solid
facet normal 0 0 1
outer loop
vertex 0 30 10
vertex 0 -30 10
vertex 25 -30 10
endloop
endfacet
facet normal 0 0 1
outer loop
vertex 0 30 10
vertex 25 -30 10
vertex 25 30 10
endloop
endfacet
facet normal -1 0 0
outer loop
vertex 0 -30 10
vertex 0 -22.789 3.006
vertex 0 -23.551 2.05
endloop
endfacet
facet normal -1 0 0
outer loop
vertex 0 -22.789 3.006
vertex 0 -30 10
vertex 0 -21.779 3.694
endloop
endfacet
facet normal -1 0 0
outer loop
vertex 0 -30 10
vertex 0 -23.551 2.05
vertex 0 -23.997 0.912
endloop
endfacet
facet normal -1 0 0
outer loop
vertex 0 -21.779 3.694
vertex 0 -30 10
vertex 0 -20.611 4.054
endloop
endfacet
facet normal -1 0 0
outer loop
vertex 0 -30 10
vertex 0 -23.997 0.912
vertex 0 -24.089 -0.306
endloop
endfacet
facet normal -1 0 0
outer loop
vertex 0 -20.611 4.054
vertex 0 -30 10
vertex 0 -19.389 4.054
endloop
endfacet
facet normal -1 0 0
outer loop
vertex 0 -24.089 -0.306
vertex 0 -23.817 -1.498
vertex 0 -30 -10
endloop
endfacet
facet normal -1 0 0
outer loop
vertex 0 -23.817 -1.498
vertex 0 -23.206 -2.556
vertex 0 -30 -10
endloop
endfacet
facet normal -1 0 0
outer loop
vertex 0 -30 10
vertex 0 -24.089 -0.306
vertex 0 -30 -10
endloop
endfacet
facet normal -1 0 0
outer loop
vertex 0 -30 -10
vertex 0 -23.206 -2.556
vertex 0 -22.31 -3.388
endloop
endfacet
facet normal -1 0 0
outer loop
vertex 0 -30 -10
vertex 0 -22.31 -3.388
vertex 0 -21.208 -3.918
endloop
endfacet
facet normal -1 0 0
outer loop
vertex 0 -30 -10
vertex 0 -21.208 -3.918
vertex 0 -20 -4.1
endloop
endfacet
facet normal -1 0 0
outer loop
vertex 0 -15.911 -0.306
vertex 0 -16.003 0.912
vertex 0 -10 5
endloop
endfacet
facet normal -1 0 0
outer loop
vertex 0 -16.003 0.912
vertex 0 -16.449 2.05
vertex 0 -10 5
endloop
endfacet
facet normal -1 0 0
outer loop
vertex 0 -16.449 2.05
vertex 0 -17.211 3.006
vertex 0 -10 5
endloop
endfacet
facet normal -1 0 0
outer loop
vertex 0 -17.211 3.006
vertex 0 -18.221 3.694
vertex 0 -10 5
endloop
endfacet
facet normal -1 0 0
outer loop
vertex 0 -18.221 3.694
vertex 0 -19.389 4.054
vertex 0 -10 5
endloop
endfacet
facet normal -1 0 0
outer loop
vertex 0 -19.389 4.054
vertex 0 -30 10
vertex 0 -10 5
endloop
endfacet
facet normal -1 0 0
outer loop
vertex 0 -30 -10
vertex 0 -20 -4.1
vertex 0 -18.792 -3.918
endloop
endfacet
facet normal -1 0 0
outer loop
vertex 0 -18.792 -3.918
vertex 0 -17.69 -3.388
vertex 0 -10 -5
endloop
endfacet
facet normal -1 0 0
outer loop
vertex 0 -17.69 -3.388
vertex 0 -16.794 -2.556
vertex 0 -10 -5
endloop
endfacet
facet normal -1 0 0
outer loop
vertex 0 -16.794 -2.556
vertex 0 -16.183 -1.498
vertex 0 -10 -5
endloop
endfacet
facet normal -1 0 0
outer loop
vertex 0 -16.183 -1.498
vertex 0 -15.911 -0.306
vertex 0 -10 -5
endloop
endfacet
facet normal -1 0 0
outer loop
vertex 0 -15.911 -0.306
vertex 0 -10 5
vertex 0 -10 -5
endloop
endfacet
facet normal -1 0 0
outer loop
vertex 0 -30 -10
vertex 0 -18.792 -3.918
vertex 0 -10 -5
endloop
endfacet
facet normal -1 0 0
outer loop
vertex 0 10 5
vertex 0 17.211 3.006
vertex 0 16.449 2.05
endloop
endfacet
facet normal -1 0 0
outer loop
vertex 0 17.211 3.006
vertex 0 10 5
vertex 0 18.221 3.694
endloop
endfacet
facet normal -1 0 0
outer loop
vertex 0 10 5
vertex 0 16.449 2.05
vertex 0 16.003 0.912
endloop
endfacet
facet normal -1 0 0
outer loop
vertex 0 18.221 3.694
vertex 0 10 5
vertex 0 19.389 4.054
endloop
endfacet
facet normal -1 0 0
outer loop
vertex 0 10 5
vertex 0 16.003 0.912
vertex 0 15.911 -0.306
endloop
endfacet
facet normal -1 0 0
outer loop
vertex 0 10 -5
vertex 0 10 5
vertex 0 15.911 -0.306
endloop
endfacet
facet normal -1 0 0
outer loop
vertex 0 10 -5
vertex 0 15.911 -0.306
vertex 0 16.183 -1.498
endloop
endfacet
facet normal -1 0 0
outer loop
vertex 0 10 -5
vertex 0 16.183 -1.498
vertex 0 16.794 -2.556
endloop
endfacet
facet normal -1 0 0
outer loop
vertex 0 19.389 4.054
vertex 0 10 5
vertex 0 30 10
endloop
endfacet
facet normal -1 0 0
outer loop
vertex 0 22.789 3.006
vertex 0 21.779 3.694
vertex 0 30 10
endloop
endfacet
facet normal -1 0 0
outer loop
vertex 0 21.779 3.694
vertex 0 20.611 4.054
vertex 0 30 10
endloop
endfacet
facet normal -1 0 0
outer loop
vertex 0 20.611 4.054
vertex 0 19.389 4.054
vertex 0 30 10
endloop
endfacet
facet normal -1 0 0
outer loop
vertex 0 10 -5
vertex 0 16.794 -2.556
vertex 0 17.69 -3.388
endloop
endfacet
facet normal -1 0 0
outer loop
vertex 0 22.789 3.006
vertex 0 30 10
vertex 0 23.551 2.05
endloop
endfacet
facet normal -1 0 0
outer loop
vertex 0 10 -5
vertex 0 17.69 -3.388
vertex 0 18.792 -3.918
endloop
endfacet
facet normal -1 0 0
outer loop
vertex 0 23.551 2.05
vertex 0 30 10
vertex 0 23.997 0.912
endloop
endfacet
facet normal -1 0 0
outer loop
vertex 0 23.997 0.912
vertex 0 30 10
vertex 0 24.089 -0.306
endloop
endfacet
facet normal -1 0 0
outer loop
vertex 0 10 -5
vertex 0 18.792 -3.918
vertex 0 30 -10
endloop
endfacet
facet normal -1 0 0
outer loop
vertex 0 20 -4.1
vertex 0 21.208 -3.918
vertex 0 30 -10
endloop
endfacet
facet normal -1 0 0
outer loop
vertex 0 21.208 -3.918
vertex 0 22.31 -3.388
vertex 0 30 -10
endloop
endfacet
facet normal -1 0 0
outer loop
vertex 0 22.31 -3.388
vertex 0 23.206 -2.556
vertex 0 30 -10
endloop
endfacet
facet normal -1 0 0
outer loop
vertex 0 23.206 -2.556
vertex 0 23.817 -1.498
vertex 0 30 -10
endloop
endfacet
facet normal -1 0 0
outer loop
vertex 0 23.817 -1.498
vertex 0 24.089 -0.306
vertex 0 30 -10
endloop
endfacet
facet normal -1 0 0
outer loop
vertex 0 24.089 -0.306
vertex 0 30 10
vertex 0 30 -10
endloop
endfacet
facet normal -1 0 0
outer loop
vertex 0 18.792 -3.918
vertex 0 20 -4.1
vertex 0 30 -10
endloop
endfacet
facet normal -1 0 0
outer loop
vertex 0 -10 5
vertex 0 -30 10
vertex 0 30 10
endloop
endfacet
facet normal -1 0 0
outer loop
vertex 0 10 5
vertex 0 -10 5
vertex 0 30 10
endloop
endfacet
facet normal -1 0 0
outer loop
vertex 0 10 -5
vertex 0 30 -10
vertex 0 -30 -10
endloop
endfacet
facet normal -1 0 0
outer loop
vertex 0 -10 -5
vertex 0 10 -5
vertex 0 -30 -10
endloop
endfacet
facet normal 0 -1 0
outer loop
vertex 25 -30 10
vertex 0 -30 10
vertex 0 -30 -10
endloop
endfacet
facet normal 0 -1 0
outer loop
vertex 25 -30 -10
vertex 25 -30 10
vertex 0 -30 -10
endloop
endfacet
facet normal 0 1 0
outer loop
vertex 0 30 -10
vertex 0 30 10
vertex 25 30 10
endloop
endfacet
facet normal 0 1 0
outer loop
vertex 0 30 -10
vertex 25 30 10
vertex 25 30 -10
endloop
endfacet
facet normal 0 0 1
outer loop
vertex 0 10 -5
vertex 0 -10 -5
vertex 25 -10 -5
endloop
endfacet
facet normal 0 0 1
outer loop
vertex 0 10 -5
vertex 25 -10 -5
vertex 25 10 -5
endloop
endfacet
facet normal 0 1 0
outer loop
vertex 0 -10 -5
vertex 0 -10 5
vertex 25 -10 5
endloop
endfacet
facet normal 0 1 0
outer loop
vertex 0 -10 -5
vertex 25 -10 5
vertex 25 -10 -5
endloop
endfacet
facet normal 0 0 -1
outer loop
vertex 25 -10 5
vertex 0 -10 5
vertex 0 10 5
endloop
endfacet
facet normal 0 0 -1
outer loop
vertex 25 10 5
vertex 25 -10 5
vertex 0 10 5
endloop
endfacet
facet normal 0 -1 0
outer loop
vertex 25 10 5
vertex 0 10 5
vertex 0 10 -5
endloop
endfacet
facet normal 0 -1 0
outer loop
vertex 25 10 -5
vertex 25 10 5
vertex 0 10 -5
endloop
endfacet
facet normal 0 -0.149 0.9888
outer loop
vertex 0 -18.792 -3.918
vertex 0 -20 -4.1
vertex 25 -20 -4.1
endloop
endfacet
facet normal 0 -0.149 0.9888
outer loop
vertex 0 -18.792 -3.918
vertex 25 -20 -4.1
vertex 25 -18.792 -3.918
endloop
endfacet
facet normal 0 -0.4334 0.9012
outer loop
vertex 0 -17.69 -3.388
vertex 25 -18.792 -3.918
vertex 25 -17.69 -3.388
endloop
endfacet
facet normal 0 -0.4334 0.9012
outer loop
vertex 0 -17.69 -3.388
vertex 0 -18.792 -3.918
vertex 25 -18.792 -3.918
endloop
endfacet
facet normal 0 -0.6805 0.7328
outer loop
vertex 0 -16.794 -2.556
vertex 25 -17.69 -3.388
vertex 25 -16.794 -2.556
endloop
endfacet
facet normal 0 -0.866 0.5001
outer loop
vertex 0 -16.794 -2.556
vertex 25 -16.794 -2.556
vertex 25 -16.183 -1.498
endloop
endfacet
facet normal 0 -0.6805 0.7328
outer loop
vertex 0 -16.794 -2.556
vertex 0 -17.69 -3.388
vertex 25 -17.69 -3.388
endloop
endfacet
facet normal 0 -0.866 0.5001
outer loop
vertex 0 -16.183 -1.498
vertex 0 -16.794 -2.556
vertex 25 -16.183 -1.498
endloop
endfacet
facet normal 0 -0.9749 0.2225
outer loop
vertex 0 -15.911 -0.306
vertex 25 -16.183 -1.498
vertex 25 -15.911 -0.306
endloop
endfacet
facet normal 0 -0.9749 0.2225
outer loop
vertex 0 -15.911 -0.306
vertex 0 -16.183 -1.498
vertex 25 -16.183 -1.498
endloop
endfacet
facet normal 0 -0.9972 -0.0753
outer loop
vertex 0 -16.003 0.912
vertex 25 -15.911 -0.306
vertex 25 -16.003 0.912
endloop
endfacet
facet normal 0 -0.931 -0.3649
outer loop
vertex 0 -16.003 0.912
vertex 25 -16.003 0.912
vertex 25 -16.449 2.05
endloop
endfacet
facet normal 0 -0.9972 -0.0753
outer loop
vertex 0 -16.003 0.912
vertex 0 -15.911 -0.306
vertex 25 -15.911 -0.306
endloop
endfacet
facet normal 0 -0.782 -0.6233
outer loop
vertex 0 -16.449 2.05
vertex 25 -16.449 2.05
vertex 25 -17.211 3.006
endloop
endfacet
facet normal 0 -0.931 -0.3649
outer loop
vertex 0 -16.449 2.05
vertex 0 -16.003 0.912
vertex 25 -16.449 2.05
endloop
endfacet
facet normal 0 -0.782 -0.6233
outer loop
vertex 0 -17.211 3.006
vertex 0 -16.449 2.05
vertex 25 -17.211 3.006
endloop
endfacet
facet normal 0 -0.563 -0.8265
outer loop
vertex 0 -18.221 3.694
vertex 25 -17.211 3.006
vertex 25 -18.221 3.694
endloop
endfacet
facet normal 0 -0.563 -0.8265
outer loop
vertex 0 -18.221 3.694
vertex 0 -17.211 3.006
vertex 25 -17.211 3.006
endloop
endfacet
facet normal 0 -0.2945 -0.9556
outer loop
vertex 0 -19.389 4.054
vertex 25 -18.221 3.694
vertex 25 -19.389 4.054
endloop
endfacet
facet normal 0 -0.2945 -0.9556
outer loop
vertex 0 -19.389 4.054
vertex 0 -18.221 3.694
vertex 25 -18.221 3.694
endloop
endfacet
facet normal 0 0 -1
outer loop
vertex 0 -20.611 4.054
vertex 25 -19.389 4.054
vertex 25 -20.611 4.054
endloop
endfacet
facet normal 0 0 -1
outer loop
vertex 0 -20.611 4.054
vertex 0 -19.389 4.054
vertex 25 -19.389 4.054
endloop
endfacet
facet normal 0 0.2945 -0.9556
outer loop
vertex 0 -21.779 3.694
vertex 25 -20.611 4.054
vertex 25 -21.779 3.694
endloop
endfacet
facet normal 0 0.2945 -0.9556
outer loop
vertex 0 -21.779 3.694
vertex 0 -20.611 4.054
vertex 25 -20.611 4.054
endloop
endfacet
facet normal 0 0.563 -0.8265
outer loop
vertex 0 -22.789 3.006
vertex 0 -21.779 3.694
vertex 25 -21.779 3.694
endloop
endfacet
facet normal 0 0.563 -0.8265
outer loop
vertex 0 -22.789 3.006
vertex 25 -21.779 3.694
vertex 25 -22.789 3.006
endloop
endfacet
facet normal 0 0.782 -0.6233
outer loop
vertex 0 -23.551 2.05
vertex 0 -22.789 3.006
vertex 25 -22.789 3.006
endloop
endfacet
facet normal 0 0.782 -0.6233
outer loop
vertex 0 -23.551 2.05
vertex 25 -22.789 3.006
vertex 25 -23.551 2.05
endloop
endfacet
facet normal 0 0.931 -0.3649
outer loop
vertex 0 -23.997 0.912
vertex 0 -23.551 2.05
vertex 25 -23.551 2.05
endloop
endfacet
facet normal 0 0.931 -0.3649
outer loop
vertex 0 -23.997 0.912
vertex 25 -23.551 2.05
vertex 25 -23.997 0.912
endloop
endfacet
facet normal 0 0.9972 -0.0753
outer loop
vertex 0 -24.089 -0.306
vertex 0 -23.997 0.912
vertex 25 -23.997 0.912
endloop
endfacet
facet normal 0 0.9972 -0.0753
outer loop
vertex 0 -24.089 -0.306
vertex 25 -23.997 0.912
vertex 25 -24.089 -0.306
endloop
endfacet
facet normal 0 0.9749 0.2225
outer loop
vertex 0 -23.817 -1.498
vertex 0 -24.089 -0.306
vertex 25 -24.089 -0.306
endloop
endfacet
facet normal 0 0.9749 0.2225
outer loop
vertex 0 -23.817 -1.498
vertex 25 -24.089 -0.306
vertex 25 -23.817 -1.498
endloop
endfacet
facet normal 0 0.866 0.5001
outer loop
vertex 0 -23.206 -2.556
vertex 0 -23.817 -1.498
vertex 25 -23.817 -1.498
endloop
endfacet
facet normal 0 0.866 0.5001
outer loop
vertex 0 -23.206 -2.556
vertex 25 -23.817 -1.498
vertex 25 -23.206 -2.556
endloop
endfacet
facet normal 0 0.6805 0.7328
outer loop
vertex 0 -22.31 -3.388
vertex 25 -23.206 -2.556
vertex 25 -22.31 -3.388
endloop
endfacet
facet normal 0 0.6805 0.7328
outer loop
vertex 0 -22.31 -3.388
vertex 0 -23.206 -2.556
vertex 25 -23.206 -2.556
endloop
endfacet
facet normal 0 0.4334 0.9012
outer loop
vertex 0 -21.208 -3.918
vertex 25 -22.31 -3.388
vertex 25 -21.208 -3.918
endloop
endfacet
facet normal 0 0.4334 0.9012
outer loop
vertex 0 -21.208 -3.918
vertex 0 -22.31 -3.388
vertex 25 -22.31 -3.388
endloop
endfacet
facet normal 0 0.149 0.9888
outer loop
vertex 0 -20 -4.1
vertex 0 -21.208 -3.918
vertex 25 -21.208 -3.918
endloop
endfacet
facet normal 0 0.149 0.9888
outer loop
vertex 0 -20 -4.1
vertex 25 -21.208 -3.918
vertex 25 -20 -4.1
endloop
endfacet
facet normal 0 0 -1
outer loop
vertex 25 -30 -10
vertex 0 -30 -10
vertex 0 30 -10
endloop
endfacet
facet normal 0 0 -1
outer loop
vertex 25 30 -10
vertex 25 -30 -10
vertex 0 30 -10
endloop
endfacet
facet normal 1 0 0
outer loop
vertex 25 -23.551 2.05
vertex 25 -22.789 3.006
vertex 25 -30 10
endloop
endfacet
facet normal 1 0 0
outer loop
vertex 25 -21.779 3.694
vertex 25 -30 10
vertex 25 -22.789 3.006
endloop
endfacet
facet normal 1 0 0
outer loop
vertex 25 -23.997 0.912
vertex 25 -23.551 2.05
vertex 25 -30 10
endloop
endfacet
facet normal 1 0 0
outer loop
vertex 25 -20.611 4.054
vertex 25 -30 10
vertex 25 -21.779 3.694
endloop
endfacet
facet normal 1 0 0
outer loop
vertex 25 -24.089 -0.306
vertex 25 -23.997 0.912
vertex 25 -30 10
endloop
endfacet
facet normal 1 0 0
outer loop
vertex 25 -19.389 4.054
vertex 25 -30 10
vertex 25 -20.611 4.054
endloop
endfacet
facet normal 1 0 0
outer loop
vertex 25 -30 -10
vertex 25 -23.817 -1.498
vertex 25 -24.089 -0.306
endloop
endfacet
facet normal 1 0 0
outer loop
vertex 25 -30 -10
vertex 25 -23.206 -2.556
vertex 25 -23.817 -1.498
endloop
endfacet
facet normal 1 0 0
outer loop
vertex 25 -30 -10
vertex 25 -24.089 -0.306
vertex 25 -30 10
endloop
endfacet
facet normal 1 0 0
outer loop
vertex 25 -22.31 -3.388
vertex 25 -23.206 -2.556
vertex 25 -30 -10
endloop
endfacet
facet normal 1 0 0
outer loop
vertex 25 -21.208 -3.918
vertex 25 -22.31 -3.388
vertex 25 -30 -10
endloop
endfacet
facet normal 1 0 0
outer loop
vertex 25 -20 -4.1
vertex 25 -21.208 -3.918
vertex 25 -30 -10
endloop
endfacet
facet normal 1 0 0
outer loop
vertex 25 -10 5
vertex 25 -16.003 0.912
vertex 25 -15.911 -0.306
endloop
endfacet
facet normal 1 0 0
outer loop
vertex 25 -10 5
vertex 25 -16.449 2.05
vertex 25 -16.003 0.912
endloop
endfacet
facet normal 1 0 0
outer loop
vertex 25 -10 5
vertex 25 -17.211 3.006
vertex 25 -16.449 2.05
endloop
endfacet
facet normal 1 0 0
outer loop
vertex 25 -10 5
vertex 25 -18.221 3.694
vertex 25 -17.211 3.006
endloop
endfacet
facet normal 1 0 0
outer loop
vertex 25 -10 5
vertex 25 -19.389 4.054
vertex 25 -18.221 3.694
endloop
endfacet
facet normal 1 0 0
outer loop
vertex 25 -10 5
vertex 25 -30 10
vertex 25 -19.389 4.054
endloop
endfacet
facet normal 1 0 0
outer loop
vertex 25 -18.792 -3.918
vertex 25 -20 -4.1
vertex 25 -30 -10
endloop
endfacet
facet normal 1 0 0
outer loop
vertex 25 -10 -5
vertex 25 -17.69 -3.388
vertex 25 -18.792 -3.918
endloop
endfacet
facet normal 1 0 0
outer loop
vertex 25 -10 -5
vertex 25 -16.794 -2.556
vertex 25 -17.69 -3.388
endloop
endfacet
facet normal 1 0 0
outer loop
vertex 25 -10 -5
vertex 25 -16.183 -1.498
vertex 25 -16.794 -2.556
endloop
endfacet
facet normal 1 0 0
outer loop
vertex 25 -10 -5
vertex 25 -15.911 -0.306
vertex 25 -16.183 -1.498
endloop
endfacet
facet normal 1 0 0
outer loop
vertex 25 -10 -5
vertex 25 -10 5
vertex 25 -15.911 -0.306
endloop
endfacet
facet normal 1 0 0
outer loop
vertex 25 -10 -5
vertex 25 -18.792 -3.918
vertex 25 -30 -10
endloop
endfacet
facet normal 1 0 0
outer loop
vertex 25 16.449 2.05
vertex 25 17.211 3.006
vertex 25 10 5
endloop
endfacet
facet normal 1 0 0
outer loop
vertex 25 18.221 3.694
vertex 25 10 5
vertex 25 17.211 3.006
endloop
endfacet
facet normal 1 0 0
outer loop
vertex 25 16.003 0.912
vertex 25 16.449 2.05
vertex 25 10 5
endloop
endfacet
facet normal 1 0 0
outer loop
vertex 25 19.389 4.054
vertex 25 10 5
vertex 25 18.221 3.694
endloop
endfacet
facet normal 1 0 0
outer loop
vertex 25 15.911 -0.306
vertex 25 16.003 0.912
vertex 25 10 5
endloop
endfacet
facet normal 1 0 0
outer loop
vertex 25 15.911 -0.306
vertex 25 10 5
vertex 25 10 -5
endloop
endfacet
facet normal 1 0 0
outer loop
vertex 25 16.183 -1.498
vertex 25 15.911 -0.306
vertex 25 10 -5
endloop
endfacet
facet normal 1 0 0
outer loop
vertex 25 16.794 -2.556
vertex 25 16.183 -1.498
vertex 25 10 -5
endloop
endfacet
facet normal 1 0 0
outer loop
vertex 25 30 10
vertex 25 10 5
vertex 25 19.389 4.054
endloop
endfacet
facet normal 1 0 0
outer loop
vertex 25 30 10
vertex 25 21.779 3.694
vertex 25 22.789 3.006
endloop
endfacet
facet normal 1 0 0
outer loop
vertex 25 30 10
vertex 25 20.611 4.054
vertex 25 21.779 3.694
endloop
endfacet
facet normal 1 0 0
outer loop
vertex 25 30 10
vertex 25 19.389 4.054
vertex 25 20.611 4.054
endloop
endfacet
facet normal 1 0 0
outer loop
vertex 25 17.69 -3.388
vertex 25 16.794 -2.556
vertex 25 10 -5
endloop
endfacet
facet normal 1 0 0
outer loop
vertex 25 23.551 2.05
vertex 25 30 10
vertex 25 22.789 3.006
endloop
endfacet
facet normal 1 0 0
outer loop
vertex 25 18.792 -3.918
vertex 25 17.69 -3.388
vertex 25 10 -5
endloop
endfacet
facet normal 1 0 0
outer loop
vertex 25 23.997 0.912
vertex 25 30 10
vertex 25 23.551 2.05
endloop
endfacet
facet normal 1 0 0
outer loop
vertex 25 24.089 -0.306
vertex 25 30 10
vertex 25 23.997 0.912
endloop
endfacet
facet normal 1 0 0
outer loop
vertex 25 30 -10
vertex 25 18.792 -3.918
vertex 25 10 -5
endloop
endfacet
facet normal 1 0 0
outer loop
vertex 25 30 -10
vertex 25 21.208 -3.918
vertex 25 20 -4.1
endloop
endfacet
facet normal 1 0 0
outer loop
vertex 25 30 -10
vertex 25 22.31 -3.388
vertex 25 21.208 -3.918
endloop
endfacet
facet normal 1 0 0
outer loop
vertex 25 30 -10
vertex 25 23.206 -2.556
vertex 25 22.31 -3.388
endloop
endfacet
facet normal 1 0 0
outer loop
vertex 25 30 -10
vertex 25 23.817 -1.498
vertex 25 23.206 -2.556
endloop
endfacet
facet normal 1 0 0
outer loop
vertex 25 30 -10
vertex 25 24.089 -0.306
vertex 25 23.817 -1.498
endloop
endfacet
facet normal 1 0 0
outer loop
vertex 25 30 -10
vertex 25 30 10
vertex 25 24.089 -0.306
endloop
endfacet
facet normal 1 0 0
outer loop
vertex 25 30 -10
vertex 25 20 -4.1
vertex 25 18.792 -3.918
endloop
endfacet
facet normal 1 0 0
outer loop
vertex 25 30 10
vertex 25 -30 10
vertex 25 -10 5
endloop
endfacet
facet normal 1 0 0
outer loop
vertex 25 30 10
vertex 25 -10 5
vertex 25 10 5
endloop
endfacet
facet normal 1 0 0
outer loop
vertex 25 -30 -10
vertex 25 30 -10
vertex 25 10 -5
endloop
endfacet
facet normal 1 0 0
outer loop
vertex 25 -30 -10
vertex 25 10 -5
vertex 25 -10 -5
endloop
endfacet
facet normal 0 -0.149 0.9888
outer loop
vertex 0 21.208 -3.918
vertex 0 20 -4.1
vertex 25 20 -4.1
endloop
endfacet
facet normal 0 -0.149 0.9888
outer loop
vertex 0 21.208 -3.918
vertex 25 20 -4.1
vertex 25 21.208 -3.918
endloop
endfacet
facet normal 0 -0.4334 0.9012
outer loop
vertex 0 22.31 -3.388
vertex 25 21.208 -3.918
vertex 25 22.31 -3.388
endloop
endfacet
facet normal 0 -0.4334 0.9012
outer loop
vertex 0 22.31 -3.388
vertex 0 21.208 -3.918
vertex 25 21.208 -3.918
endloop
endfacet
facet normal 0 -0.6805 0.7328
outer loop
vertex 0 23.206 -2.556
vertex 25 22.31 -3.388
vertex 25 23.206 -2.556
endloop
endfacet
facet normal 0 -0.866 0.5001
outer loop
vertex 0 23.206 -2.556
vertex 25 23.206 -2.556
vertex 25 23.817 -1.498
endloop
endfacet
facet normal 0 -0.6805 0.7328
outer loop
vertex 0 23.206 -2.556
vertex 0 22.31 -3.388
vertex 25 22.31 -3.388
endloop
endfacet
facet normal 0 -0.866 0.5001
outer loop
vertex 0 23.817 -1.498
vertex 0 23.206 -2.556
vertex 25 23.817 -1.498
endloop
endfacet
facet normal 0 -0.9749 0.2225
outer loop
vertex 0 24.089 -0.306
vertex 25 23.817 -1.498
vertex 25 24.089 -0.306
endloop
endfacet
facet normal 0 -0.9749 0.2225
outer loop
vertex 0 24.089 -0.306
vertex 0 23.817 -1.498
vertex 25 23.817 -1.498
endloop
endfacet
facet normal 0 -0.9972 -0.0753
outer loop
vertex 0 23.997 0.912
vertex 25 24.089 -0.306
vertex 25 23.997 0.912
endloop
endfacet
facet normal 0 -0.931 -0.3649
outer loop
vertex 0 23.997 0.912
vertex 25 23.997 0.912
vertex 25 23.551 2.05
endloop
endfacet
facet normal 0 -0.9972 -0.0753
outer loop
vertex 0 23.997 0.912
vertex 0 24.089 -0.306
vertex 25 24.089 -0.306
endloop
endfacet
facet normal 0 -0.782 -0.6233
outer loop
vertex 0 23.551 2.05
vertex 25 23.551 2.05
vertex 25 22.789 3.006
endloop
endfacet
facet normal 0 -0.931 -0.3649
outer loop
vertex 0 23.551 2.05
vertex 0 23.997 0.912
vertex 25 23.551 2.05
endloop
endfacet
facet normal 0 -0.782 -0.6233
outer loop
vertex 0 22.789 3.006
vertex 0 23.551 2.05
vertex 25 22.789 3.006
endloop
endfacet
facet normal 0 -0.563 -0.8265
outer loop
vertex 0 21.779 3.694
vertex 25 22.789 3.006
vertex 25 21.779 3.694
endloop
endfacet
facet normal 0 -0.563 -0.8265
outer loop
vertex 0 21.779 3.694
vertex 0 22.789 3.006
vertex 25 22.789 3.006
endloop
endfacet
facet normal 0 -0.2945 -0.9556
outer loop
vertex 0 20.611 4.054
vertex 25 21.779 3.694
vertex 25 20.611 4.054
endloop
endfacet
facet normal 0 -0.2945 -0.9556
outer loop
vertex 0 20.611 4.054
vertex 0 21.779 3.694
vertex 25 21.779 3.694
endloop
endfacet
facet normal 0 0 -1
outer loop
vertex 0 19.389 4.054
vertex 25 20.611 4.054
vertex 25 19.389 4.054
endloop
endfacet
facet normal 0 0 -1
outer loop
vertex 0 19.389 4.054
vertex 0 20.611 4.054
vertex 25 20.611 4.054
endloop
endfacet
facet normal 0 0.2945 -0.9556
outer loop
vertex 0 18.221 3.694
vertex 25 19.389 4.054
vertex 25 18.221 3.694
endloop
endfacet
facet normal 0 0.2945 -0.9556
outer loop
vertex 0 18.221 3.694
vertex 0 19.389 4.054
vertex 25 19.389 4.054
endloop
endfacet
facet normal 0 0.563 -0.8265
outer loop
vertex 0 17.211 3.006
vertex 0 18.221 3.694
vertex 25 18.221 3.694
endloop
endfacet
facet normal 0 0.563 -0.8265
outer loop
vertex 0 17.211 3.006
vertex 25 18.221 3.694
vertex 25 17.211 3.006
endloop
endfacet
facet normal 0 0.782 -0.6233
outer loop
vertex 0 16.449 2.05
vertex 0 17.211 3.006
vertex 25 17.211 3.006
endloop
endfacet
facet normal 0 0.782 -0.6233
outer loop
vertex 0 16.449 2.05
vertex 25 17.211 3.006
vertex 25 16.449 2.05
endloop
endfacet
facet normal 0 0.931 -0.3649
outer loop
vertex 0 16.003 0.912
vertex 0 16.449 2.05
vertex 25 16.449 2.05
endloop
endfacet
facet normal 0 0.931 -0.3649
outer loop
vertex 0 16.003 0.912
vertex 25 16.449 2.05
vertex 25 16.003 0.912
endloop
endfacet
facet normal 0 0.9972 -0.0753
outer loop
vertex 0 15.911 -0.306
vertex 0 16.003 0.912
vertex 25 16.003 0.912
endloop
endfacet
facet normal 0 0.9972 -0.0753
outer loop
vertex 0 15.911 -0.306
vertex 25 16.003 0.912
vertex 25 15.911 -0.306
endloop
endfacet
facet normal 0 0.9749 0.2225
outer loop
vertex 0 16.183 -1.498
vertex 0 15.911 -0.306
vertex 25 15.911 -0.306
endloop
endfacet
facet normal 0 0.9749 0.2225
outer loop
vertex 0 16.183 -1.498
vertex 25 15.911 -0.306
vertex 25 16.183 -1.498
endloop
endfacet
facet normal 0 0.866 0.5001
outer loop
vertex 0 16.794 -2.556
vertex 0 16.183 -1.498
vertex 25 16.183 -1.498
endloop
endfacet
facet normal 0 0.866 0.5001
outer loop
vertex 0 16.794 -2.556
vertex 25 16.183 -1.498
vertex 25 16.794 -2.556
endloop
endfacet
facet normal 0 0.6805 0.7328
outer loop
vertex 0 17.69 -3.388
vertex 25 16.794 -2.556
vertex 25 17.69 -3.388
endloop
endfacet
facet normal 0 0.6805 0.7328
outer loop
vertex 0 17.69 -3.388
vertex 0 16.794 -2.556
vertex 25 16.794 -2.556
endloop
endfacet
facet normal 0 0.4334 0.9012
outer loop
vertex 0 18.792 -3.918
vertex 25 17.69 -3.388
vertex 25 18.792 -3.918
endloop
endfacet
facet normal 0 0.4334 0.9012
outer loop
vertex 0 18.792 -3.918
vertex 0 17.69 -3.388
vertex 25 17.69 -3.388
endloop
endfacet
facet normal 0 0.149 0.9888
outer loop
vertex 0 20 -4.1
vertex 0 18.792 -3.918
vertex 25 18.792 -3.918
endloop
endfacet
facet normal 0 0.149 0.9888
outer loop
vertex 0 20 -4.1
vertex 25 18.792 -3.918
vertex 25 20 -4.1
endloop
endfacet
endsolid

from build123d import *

# Parameters (mm, degrees)
SKETCH1_W           = 20
SKETCH1_H           = 60
SKETCH1_R           = 4.1
SKETCH1_W_2         = 10
SKETCH1_H_2         = 20
BOSS_EXTRUDE1_DEPTH = 25


with BuildPart() as part:
    # Sketch1 → Boss-Extrude1 (new body)
    with BuildSketch(Plane(origin=(0, 0, 0), x_dir=(0, 0, -1), z_dir=(1, 0, 0))):
        Rectangle(SKETCH1_W, SKETCH1_H)
        with Locations((0, 20)):
            Circle(SKETCH1_R, mode=Mode.SUBTRACT)
        with Locations((0, -20)):
            Circle(SKETCH1_R, mode=Mode.SUBTRACT)
        Rectangle(SKETCH1_W_2, SKETCH1_H_2, mode=Mode.SUBTRACT)
    extrude(amount=BOSS_EXTRUDE1_DEPTH)


solid = part.part
